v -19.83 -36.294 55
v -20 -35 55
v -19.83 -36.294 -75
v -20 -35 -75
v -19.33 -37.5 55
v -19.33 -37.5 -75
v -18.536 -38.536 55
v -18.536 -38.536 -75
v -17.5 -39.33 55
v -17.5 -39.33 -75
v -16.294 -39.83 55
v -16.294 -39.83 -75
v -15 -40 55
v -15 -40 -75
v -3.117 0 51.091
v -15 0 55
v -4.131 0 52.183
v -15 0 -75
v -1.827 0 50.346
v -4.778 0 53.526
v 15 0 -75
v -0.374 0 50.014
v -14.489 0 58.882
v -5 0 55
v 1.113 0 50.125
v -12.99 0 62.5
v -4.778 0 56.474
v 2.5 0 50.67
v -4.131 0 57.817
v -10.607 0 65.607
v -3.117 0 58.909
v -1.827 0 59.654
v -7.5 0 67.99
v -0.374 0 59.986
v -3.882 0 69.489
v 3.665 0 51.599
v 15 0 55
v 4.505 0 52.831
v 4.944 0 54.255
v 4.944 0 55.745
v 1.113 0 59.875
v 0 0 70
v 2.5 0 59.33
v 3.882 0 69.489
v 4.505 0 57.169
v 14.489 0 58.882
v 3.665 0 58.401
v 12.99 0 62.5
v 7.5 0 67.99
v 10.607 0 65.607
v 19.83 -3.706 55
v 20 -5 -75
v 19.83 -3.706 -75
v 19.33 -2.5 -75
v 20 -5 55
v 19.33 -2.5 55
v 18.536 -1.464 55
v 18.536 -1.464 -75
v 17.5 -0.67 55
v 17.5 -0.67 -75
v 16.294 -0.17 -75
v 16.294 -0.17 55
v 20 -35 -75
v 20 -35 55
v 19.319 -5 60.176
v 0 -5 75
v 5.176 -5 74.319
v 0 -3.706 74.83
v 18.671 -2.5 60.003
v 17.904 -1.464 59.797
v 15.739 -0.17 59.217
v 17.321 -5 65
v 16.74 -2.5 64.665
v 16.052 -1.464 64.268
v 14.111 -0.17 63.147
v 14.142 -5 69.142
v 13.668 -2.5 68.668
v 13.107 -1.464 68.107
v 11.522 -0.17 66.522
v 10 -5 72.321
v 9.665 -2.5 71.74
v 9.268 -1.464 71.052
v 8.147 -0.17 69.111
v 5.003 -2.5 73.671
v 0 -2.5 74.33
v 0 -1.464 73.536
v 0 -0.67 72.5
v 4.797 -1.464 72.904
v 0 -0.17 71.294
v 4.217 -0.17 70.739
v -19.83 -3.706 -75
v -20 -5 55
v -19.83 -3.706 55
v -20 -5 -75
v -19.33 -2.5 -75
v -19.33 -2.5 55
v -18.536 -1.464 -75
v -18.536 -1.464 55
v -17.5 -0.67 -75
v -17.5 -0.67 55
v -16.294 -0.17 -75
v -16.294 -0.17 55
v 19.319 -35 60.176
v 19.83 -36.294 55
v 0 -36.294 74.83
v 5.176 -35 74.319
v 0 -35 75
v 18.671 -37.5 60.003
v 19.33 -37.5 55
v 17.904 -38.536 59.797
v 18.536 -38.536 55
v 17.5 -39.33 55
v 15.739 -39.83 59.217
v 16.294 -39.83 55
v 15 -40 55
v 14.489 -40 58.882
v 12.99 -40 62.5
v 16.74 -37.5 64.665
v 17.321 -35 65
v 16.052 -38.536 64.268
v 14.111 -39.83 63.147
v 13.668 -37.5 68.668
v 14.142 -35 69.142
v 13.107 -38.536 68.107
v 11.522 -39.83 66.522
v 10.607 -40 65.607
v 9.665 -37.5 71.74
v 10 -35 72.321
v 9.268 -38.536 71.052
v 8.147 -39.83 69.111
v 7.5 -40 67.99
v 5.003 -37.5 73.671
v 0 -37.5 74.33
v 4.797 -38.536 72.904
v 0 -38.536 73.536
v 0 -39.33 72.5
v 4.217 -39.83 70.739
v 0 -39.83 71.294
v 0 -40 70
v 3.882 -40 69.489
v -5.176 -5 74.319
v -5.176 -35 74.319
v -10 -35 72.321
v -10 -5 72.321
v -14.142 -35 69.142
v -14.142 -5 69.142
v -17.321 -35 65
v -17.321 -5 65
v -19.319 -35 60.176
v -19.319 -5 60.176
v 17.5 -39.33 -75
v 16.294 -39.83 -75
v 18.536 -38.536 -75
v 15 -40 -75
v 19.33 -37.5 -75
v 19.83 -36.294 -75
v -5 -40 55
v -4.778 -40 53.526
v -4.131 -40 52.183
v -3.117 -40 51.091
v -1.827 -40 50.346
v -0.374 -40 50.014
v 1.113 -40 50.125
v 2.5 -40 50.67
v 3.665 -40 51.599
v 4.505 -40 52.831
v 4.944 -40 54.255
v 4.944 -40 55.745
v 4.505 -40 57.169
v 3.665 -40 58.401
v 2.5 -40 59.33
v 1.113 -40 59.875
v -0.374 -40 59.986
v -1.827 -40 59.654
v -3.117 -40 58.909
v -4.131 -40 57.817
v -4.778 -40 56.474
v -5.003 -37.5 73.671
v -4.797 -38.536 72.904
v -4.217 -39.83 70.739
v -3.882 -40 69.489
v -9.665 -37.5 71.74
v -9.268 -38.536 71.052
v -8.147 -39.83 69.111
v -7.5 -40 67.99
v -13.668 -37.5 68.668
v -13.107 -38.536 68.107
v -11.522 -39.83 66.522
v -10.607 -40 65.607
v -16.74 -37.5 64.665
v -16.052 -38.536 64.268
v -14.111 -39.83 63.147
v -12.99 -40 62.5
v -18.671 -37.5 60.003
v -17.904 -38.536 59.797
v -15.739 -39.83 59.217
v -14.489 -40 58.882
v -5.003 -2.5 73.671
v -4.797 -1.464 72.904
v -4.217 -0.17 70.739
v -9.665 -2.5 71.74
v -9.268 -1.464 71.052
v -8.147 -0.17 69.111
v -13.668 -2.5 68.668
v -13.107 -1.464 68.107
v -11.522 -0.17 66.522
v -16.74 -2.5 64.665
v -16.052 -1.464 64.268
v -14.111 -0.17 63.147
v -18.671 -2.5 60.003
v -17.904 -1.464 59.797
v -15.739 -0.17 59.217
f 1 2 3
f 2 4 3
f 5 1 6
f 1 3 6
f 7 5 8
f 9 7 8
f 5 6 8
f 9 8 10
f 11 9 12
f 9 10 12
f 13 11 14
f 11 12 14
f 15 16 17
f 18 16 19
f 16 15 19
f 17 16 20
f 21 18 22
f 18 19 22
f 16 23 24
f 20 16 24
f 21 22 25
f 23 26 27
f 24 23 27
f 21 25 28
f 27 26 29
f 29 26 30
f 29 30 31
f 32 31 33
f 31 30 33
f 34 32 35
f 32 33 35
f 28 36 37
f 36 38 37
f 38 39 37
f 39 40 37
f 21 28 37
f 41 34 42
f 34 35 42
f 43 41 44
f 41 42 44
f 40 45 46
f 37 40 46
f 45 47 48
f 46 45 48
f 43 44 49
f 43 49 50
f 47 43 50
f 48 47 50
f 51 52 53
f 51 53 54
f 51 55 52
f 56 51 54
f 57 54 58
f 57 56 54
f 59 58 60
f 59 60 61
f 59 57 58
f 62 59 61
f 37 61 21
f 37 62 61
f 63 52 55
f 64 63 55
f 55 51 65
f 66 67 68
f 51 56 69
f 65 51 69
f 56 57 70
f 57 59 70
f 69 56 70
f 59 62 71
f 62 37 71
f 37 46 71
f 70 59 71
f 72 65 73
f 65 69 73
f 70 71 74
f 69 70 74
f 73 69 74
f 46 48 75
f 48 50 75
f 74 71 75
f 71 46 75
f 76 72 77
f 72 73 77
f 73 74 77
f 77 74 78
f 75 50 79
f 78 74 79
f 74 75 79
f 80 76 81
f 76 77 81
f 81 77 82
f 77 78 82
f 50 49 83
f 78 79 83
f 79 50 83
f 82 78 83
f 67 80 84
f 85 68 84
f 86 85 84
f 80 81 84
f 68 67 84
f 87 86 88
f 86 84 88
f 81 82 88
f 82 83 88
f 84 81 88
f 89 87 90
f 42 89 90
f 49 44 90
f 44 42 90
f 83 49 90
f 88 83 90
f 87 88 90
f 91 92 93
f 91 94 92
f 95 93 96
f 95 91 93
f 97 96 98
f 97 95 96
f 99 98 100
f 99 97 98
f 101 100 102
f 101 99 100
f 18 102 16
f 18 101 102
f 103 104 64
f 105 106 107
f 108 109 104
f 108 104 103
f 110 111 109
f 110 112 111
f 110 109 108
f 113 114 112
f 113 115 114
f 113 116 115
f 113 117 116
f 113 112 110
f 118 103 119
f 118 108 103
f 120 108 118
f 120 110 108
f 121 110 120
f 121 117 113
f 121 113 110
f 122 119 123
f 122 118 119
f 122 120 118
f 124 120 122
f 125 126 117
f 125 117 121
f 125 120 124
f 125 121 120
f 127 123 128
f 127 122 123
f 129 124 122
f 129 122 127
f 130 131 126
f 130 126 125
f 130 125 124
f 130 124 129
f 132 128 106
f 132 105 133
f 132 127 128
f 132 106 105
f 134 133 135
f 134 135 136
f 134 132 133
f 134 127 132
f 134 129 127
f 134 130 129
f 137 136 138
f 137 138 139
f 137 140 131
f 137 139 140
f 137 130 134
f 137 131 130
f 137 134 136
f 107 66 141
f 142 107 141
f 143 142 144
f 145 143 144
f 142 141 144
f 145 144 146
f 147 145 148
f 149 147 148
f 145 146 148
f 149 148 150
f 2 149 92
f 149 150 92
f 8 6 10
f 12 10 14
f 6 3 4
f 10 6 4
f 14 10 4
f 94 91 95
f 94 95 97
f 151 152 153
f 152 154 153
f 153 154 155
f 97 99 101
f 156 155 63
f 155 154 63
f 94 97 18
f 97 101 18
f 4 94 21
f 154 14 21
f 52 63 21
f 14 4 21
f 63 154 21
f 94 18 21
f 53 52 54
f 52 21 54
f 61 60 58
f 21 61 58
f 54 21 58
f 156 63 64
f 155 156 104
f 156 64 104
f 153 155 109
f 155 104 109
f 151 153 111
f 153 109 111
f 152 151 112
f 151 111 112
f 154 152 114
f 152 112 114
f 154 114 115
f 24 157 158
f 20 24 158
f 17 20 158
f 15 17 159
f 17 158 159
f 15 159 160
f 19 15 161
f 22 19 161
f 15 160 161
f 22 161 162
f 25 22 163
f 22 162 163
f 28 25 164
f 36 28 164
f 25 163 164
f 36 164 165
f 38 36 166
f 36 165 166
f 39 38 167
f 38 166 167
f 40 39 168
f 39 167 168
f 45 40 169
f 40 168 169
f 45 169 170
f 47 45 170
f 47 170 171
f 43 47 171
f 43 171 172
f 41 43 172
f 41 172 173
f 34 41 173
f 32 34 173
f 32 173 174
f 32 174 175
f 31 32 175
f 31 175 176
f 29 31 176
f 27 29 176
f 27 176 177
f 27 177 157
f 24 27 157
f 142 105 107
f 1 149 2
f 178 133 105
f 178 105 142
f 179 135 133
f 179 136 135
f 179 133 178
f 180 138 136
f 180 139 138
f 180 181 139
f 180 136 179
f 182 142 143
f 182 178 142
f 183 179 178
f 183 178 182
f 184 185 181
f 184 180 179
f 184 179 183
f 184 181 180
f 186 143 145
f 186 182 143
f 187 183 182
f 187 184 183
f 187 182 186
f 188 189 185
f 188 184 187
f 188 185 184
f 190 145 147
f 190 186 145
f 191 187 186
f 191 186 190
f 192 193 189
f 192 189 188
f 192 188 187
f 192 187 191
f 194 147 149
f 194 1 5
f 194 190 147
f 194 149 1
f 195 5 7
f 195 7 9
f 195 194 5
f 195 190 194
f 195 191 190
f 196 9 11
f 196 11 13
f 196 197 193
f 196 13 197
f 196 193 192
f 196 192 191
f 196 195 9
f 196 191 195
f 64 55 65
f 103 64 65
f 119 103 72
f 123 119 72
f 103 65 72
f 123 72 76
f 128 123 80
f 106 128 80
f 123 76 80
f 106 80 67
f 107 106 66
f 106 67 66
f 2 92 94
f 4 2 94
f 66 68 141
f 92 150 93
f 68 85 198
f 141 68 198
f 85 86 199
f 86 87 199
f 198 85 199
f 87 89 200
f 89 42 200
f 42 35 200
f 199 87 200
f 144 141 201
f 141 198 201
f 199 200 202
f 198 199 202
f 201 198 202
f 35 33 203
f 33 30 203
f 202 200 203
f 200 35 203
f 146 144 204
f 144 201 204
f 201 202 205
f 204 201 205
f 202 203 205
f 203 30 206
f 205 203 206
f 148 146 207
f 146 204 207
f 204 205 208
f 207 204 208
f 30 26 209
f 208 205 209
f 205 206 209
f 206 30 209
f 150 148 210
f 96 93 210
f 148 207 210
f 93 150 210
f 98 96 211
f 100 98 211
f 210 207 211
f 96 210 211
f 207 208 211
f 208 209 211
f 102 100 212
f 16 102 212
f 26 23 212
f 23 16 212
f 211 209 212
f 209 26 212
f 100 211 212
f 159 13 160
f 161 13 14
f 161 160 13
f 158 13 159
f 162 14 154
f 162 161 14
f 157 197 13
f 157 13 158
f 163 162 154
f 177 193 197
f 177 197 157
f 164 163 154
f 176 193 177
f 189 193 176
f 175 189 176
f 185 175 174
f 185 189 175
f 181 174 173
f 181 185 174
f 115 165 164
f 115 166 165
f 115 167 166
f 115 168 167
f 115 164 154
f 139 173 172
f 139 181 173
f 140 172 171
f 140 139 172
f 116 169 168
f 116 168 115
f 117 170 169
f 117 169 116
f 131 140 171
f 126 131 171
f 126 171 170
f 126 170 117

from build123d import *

# Parameters (mm, degrees)
F1_DEPTH = 40
F2_D     = 10
F3_R     = 5


with BuildPart() as f1:
    # F0 (on Front) → F1 (new body)
    with BuildSketch(Plane.XZ):
        with BuildLine():
            Line((-20, 55), (-20, -75))
            Line((-20, -75), (20, -75))
            Line((20, -75), (20, 55))
            ThreePointArc((20, 55), (14.1421356237, 69.1421356237), (0, 75))
            ThreePointArc((0, 75), (-14.1421356237, 69.1421356237), (-20, 55))
        make_face()
    extrude(amount=F1_DEPTH)

    # F2 (through all)
    with Locations(Plane(origin=(0, 0, 0), x_dir=(1, 0, 0), z_dir=(0, 1, 0))):
        with Locations((0, -55)):
            Hole(F2_D / 2)

    # F3
    f3_edges = [f1.edges().sort_by_distance(p)[0] for p in [
        (0, -40, 75),
        (0, 0, 75),
        (-20, 0, -10),
        (-20, -40, -10),
        (20, 0, -10),
        (20, -40, -10),
    ]]
    fillet(f3_edges, radius=F3_R)


solid = f1.part
